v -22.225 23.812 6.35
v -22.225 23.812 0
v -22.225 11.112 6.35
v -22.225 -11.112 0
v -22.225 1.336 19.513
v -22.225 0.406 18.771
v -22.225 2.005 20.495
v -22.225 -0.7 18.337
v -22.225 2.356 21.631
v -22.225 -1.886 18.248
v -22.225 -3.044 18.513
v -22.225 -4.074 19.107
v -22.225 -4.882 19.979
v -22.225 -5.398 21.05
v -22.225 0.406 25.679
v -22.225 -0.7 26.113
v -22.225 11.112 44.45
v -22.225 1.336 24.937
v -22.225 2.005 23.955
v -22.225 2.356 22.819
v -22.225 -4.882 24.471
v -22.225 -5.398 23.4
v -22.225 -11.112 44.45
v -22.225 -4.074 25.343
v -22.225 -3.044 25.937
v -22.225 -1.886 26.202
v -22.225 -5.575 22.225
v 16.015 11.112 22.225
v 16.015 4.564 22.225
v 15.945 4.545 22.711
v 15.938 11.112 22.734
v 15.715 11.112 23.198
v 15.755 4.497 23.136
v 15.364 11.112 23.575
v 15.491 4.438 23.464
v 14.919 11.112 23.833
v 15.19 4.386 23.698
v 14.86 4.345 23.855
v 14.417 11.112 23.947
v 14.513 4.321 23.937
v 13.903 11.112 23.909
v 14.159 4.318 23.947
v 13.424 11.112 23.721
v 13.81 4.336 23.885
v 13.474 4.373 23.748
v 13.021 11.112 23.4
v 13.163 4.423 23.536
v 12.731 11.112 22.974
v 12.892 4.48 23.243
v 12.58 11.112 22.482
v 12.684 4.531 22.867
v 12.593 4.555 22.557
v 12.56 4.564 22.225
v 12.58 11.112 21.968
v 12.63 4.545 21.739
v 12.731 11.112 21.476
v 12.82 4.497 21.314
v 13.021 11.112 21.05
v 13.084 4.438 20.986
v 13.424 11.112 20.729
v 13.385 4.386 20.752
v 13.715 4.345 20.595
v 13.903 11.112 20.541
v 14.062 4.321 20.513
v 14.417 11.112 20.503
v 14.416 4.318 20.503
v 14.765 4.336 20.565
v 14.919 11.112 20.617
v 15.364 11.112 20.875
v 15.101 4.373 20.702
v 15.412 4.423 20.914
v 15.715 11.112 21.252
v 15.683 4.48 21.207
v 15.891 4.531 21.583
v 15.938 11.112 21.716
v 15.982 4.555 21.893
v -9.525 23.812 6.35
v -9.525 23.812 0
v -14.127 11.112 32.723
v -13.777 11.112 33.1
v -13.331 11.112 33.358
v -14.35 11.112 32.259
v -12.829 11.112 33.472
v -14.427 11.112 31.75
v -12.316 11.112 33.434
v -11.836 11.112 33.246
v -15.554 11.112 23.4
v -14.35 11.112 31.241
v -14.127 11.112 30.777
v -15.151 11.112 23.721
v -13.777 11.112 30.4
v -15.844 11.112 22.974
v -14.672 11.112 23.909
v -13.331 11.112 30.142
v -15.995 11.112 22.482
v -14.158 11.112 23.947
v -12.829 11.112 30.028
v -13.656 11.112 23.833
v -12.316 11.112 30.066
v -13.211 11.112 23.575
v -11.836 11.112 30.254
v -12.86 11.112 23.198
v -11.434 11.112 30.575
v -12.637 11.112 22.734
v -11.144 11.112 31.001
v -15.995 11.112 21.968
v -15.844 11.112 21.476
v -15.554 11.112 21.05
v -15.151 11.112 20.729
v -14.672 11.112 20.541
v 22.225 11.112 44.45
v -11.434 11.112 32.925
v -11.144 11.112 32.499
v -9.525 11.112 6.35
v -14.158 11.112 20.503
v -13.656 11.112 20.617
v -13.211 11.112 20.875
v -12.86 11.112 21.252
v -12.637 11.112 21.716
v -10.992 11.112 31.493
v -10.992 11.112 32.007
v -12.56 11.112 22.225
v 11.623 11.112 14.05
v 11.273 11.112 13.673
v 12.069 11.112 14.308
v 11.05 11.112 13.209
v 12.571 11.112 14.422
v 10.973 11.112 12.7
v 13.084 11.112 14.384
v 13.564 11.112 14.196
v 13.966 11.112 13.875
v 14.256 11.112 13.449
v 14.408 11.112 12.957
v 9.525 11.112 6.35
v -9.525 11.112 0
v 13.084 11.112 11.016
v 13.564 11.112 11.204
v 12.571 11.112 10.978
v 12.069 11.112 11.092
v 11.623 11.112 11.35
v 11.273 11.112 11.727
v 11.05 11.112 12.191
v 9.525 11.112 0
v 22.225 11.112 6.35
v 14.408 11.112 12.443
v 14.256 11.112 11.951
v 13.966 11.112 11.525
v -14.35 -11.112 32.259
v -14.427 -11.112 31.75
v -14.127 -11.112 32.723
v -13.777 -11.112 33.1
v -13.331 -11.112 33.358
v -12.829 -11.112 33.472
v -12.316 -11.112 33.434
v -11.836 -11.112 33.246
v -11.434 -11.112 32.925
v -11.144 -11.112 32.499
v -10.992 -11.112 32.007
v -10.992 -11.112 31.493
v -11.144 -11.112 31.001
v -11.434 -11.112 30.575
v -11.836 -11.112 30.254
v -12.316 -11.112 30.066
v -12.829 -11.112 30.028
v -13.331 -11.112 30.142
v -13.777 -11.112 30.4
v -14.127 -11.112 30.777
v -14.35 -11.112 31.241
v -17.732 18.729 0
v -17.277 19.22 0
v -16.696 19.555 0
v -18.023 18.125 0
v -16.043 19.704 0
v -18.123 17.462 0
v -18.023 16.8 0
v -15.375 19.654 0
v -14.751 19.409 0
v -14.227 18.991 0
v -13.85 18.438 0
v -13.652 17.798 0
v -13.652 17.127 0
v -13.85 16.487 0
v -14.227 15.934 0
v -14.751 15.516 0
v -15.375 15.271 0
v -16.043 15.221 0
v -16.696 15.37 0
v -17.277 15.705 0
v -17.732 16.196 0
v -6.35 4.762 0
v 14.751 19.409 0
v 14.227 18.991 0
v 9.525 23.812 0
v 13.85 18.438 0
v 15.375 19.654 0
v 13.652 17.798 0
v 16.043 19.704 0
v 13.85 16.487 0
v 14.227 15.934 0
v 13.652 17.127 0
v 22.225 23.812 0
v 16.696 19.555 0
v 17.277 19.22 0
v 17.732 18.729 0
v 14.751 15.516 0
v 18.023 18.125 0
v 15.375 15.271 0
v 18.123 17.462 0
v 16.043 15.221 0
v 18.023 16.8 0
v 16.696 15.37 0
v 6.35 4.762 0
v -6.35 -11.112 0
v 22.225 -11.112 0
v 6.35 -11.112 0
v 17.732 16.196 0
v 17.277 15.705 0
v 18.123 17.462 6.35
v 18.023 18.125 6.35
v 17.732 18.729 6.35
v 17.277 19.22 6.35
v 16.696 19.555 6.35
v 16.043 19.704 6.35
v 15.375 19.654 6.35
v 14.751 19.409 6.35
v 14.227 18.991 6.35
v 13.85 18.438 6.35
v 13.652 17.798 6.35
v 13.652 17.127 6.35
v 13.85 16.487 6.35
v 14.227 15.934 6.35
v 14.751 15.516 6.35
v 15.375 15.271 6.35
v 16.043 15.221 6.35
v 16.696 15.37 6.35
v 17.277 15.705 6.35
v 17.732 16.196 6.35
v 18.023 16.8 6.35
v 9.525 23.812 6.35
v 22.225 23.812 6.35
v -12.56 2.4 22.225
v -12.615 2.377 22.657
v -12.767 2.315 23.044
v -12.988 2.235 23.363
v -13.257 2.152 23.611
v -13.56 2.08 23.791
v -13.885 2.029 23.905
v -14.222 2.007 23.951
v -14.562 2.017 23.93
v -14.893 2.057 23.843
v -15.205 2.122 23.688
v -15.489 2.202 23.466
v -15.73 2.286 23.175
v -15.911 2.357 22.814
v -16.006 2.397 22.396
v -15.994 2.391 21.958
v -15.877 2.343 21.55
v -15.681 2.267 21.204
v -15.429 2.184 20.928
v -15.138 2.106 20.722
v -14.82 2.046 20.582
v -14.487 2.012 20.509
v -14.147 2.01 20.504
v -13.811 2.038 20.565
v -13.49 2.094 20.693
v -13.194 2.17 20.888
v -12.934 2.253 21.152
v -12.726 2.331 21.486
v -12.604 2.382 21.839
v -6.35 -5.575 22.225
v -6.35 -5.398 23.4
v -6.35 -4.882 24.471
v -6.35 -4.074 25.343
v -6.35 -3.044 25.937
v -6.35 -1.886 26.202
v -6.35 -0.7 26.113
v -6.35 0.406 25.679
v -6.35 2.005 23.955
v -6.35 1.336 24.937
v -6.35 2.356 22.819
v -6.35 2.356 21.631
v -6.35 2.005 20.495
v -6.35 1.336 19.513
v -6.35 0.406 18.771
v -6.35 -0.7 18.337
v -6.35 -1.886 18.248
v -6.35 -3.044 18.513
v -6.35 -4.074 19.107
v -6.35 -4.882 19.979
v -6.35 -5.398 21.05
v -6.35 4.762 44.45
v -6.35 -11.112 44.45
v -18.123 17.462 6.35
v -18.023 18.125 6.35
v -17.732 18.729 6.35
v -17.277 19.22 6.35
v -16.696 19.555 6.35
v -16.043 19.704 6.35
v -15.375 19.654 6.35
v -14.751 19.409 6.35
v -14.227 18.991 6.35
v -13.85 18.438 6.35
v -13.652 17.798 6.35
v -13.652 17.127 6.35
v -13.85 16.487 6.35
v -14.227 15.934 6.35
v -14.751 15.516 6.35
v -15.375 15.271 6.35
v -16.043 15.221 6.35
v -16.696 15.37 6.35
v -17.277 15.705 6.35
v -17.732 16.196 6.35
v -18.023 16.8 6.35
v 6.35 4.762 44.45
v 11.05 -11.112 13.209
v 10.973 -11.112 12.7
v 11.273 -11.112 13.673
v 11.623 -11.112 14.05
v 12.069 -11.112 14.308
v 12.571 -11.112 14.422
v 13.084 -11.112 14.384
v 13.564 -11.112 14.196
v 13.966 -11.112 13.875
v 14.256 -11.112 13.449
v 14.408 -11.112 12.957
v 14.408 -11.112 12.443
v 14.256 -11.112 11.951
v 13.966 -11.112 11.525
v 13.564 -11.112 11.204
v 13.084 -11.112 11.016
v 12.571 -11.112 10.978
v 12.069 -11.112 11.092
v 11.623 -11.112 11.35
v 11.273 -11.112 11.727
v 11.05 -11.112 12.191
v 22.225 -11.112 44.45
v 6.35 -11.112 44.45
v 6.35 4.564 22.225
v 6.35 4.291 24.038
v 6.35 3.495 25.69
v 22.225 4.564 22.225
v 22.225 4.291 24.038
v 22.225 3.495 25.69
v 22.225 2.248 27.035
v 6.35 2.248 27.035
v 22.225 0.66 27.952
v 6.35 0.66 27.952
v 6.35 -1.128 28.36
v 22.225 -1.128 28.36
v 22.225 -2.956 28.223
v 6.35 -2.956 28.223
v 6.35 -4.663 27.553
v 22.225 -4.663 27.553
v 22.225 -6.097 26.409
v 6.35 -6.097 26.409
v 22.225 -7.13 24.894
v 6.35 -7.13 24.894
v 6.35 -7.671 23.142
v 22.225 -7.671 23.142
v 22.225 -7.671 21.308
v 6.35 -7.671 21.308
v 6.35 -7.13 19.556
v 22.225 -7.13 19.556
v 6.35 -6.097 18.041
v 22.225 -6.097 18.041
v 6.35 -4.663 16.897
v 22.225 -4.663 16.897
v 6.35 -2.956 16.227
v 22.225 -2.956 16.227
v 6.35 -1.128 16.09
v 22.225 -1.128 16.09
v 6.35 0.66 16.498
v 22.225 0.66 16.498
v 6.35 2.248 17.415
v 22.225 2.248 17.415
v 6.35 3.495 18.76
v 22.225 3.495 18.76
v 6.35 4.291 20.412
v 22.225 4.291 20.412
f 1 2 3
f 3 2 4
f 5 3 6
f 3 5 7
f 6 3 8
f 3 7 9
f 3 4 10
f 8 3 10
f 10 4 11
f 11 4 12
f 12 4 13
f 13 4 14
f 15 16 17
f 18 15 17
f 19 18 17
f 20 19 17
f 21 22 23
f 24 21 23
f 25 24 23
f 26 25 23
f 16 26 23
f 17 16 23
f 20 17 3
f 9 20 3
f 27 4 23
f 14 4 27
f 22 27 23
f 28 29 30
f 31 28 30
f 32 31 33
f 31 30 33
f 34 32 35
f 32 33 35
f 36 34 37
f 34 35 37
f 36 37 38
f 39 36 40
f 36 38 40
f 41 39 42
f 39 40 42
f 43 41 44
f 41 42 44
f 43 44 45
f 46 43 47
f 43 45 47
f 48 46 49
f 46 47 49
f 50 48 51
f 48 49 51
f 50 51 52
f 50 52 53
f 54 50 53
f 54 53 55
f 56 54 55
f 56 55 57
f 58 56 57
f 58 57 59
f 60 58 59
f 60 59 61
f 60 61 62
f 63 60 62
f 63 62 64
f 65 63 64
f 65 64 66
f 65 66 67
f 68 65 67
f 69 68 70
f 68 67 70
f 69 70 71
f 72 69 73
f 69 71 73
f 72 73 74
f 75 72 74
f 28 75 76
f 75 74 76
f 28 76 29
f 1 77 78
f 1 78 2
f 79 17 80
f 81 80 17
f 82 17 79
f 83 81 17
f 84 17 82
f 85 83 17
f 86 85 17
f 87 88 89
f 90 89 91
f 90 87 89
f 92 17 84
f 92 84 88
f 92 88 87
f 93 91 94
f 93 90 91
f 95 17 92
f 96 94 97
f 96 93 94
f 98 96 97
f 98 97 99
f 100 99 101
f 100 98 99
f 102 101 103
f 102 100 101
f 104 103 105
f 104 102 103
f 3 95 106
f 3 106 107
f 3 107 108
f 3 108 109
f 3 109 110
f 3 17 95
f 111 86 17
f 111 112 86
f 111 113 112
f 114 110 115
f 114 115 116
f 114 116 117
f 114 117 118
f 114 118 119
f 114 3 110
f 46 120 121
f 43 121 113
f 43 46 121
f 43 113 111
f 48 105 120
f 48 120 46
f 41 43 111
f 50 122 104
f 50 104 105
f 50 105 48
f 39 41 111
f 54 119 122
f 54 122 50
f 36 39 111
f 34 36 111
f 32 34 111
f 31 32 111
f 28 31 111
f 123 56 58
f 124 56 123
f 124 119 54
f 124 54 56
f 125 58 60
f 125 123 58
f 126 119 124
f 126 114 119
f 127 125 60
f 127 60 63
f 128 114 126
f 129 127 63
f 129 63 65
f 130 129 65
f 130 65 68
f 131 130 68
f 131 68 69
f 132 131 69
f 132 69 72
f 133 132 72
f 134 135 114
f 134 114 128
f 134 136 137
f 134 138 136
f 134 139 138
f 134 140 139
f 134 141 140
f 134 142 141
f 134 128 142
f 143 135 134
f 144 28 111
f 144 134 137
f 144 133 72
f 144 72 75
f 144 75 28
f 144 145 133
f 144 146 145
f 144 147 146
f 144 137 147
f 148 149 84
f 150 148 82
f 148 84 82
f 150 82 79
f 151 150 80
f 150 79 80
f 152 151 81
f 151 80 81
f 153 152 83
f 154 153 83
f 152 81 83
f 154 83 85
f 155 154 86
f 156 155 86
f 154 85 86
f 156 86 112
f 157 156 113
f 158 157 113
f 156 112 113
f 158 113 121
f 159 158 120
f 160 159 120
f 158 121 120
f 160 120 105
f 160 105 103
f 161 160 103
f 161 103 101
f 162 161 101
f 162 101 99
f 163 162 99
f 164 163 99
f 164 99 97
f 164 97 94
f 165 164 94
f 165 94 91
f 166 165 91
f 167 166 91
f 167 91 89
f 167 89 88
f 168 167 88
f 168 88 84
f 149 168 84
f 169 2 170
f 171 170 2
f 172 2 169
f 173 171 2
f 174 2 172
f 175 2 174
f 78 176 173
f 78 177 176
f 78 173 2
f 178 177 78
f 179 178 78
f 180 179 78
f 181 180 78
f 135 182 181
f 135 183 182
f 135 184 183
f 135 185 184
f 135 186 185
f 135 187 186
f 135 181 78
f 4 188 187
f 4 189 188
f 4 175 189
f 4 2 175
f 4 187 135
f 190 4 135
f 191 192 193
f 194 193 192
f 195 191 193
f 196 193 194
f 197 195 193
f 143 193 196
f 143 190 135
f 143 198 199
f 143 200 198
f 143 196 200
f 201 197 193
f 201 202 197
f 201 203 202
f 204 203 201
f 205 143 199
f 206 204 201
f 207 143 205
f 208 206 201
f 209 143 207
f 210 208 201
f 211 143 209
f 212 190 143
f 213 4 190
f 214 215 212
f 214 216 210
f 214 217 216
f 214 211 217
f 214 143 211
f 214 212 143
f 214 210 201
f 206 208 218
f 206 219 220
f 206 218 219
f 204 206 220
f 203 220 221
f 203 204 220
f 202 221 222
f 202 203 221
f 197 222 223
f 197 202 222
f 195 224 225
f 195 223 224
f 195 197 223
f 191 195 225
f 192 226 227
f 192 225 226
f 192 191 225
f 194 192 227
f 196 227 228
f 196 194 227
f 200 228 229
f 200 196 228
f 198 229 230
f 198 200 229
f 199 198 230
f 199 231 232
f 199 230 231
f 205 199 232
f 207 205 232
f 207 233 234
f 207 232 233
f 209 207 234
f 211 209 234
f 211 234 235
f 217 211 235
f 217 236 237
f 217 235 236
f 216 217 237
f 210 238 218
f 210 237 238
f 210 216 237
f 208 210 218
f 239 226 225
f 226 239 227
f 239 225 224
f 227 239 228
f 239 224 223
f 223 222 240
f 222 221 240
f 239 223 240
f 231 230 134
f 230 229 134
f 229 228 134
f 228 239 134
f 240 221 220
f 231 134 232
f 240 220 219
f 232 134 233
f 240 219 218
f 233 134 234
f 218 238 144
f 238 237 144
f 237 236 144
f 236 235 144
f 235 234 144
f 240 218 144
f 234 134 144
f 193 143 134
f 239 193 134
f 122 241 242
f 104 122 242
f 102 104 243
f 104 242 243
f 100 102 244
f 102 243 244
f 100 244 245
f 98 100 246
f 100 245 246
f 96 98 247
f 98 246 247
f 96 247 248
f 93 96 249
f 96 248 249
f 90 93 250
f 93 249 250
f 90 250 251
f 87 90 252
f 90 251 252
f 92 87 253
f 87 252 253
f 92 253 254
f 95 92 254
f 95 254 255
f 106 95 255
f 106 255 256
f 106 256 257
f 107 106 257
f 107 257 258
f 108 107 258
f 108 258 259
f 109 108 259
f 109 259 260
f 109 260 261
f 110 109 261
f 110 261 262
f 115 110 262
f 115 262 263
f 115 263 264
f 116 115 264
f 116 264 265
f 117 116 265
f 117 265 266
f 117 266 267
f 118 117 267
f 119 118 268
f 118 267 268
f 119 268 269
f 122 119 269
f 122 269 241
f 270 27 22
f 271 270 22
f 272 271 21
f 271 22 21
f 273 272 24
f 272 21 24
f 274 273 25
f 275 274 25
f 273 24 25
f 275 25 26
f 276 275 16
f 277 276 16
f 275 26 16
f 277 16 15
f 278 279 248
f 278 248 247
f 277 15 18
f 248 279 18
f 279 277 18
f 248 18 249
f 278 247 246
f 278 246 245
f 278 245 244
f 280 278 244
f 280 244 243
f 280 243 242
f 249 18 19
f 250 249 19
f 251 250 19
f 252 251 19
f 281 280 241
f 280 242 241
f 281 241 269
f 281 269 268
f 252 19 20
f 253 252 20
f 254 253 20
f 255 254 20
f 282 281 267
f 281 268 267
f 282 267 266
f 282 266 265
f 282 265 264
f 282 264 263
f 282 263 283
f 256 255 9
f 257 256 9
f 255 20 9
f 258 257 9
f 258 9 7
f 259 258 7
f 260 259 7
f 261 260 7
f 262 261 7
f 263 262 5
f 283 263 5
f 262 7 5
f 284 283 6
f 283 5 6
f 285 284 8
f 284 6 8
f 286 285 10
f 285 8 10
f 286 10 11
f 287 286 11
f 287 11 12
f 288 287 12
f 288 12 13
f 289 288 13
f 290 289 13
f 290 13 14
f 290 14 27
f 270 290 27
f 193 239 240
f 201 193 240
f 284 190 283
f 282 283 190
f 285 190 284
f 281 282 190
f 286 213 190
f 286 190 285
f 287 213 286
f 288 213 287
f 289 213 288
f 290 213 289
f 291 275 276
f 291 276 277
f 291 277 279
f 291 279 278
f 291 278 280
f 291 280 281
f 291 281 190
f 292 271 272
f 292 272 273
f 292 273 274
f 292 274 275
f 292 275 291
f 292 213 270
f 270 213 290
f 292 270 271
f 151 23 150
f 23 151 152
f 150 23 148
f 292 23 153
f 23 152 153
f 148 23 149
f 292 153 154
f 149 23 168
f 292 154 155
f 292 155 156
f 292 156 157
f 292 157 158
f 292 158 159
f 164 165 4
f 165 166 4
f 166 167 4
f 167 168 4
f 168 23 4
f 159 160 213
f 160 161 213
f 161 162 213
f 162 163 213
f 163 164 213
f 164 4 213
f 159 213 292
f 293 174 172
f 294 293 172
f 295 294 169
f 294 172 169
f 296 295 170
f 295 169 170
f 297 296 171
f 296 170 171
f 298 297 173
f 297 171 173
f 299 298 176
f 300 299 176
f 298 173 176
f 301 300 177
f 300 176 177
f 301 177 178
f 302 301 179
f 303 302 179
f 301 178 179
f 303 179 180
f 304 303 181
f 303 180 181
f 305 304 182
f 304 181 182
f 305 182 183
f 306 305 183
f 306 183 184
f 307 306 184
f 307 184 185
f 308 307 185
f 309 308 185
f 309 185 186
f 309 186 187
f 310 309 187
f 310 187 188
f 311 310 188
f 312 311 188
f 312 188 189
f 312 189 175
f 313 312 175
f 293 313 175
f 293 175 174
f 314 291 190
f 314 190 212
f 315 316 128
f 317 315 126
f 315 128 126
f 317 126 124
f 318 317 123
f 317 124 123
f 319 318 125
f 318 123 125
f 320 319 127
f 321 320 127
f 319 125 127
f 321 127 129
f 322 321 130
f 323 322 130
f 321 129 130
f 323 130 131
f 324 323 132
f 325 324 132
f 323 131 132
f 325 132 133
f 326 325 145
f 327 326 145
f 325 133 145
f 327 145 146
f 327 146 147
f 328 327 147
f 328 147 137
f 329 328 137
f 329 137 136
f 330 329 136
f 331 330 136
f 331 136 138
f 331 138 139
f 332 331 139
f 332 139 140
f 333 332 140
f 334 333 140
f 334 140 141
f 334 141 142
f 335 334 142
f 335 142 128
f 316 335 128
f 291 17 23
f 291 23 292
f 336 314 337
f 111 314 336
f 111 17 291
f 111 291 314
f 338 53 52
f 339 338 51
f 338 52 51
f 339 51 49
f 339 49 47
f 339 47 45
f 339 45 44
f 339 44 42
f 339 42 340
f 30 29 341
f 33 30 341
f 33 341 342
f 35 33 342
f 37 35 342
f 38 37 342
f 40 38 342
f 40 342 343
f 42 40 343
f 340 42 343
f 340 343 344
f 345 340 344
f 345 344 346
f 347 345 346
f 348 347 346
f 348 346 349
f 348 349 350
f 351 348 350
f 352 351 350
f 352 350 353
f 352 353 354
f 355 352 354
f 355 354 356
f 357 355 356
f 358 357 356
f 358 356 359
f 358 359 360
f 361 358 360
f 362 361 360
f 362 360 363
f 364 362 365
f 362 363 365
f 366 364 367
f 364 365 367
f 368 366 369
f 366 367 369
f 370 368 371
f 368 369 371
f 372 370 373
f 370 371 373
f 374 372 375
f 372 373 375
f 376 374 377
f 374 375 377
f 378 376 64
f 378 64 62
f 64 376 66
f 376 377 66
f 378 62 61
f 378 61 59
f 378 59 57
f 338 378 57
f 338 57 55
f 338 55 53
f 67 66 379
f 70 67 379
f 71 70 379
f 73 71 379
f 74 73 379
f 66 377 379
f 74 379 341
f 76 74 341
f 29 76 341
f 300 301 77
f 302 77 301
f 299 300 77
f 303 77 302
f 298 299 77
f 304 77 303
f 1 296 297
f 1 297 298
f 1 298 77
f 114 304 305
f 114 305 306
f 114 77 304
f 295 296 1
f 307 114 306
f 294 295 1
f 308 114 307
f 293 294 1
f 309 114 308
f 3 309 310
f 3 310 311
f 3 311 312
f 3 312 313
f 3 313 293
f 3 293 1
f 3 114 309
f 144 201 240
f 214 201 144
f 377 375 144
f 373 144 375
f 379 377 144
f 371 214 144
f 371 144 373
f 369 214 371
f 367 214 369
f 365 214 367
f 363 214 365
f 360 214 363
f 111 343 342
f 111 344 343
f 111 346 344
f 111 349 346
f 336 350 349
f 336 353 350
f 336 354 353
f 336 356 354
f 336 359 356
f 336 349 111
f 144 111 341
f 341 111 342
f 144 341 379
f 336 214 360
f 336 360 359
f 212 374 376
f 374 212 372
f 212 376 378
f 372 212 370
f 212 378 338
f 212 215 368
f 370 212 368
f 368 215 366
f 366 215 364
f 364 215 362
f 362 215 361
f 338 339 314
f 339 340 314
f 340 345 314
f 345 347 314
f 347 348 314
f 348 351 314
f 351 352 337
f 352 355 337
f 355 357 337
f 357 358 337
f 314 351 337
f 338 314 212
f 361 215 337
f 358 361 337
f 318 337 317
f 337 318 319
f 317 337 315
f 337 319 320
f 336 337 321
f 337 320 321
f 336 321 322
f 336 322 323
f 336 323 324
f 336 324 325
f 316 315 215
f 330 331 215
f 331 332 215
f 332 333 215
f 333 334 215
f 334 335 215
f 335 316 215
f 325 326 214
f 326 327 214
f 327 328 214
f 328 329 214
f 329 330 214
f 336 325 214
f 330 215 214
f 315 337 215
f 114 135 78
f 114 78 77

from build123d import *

# Parameters (mm, degrees)
F0_W      = 44.45
F0_H      = 22.225
F1_DEPTH  = 44.45
F2_W      = 12.7
F2_H      = 44.45
F3_DEPTH  = 15.875
F5_W      = 12.7
F5_H      = 6.35
F6_DEPTH  = 12.7
F8_D      = 4.4958
F10_D     = 3.4544
F12_R     = 3.9878
F13_DEPTH = 44.451
F14_R     = 6.15188
F15_DEPTH = 28.575
F17_D     = 3.4544
F17_DEPTH = 12.7
F17_TIP   = 1.0378064612


# Not quite as in the source:
# - an extrude ends at something that could not be found from the text; its depth is read off the source's solid
# - a pattern or mirror of a feature is missing from the dataset's text; its kind, count and spacing are read off the source's solid


with BuildPart() as f1:
    # F0 (on Top) → F1 (new body)
    with BuildSketch(Plane.XY):
        Rectangle(F0_W, F0_H)
    extrude(amount=F1_DEPTH)

    # F2 (on face) → F3 (cut)
    with BuildSketch(Plane.XZ.offset(11.1125)):
        with Locations((0, 22.225)):
            Rectangle(F2_W, F2_H)
    extrude(amount=-F3_DEPTH, mode=Mode.SUBTRACT)

    # F5 (on face) → F6 (join)
    with BuildSketch(Plane(origin=(0, 11.1125, 0), x_dir=(-1, 0, 0), z_dir=(0, 1, 0))):
        with Locations((15.875, 3.175)):
            Rectangle(F5_W, F5_H)
    f6 = extrude(amount=F6_DEPTH)

    # F6_copies: F6 across plane
    add(f6.mirror(Plane(origin=(0, 0, 0), x_dir=(0, 0, 1), z_dir=(1, 0, 0))))

    # F8 (through all)
    with Locations(Plane.XY.offset(6.35)):
        with Locations((-15.875, 17.4625)):
            f8 = Hole(F8_D / 2)

    # F8_copies: F8 across plane
    add(f8.mirror(Plane(origin=(0, 0, 0), x_dir=(0, 0, 1), z_dir=(1, 0, 0))), mode=Mode.SUBTRACT)

    # F10 (through all)
    with Locations(Plane.XZ.offset(11.1125)):
        with Locations((-12.7, 31.75), (12.7, 12.7)):
            Hole(F10_D / 2)

    # F12 (on face) → F13 (cut, through all)
    with BuildSketch(Plane(origin=(-22.225, 0, 0), x_dir=(0, -1, 0), z_dir=(-1, 0, 0))):
        with Locations((1.5875, 22.225)):
            Circle(F12_R)
    extrude(amount=-F13_DEPTH, mode=Mode.SUBTRACT)

    # F14 (on face) → F15 (cut, through all)
    with BuildSketch(Plane.YZ.offset(22.225)):
        with Locations((-1.5875, 22.225)):
            Circle(F14_R)
    extrude(amount=-F15_DEPTH, mode=Mode.SUBTRACT)

    # F17
    with Locations(Plane(origin=(0, 11.1125, 0), x_dir=(-1, 0, 0), z_dir=(0, 1, 0))):
        with Locations((-14.2875, 22.225), (14.2875, 22.225)):
            Hole(F17_D / 2, depth=F17_DEPTH)
            with Locations((0, 0, -(F17_DEPTH + F17_TIP / 2))):  # 118° drill point
                Cone(0, F17_D / 2, F17_TIP, mode=Mode.SUBTRACT)


solid = f1.part
